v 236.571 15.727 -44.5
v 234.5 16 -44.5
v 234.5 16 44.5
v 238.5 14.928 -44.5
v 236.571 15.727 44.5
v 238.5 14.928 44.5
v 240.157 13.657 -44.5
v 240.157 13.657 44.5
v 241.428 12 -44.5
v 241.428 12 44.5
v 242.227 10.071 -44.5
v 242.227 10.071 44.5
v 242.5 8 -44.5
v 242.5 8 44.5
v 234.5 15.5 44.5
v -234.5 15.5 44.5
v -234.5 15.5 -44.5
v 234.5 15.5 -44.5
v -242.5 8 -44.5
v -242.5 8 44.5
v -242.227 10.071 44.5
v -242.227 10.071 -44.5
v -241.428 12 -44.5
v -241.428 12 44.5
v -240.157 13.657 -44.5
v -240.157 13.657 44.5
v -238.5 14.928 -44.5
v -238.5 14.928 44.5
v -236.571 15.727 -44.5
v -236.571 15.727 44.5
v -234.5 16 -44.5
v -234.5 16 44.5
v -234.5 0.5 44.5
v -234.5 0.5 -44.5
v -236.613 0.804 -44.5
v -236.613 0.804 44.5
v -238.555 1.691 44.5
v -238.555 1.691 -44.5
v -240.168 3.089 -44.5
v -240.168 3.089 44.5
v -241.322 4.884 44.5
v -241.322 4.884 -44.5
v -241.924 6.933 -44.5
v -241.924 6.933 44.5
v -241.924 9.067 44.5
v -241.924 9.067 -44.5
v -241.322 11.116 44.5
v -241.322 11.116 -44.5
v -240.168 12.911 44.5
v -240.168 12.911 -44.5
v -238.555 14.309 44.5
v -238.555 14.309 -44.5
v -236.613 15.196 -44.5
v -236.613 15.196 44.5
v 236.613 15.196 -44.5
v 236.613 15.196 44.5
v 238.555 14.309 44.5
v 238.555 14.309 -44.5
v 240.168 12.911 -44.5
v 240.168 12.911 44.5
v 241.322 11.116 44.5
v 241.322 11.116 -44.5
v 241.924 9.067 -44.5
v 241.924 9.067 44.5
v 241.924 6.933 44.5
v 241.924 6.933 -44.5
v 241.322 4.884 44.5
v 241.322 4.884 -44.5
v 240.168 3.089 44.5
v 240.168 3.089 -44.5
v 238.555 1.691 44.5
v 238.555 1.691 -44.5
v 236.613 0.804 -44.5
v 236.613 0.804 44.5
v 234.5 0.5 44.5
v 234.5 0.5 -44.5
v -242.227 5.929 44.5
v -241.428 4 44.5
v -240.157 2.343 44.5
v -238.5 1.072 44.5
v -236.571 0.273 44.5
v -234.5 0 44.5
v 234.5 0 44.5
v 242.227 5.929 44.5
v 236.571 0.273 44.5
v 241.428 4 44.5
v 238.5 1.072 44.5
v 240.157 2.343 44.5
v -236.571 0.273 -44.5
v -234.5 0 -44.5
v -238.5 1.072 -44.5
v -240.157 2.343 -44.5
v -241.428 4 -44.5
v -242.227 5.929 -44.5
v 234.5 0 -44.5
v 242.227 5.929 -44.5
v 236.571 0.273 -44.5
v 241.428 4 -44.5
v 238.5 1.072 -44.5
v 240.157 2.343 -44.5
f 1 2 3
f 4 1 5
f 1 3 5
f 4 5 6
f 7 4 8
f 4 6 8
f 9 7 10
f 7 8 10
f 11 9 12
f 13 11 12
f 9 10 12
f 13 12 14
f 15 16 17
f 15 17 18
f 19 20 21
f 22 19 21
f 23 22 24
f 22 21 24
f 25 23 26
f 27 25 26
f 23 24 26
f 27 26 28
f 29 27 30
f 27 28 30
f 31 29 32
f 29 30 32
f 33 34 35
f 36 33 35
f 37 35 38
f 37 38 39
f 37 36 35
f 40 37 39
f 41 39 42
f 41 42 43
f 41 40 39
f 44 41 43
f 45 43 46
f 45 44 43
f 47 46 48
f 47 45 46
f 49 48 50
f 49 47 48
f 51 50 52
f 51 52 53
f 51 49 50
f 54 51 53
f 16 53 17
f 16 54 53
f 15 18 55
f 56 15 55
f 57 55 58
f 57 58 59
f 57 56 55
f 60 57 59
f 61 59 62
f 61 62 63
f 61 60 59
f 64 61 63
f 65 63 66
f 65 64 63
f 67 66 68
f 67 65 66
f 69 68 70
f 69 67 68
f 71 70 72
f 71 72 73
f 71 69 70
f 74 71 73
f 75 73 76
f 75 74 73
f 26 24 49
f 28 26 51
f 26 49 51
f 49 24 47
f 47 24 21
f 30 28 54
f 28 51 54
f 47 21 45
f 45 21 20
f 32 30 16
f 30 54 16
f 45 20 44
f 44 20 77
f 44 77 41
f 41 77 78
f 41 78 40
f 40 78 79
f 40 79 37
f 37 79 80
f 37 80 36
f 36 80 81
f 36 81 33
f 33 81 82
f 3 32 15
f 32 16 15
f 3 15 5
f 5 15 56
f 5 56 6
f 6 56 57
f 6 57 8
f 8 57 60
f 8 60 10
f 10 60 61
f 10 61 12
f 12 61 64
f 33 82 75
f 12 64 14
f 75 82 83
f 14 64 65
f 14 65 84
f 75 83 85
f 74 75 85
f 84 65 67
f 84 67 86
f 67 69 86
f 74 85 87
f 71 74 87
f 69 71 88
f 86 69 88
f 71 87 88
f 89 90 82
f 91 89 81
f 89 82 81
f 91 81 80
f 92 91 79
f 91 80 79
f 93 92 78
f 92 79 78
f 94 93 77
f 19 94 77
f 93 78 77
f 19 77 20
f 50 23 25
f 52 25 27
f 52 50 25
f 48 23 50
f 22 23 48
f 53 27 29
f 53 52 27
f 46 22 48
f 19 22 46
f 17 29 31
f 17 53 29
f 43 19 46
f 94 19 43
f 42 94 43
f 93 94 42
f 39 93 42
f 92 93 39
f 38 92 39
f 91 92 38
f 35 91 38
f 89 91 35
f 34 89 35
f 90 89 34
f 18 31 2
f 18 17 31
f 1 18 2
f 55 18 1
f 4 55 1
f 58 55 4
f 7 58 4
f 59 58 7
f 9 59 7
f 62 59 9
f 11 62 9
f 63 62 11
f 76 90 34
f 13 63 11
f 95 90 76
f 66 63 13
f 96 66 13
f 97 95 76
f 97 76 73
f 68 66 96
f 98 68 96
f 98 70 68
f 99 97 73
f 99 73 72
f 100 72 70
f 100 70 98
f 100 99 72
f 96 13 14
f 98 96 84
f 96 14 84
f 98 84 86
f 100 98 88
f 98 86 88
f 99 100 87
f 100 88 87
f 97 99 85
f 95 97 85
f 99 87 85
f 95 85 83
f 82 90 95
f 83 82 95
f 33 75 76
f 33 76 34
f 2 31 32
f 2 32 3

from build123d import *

# Parameters (mm, degrees)
CROQUIS1_W              = 485
CROQUIS1_H              = 89
SALIENTE_EXTRUIR1_DEPTH = 16
CORTAR_EXTRUIR2_DEPTH   = 89
CORTAR_EXTRUIR3_DEPTH   = 89
CORTAR_EXTRUIR4_DEPTH   = 89


with BuildPart() as part:
    # Croquis1 → Saliente-Extruir1 (new body)
    with BuildSketch(Plane(origin=(0, 0, 0), x_dir=(1, 0, 0), z_dir=(0, 1, 0))):
        Rectangle(CROQUIS1_W, CROQUIS1_H)
    extrude(amount=SALIENTE_EXTRUIR1_DEPTH)

    # Croquis2 → Cortar-Extruir2 (cut)
    with BuildSketch(Plane.XY.offset(44.5)):
        with BuildLine():
            ThreePointArc((-234.5, 0), (-240.156854249, 2.343145751), (-242.5, 8))
            Line((-242.5, 8), (-242.5, 0))
            Line((-242.5, 0), (-234.5, 0))
        make_face()
        with BuildLine():
            ThreePointArc((-242.5, 8), (-240.156854236, 13.656854263), (-234.499999961, 16))
            Line((-234.499999961, 16), (-242.5, 16))
            Line((-242.5, 16), (-242.5, 8))
        make_face()
    extrude(amount=-CORTAR_EXTRUIR2_DEPTH, mode=Mode.SUBTRACT)

    # Croquis3 → Cortar-Extruir3 (cut)
    with BuildSketch(Plane.XY.offset(44.5)):
        with BuildLine():
            Line((242.5, 16), (234.5, 16))
            ThreePointArc((234.5, 16), (240.156854249, 13.656854249), (242.5, 8))
            Line((242.5, 8), (242.5, 16))
        make_face()
        with BuildLine():
            Line((242.5, 0), (242.5, 8))
            ThreePointArc((242.5, 8), (240.156854249, 2.343145751), (234.5, 0))
            Line((234.5, 0), (242.5, 0))
        make_face()
    extrude(amount=-CORTAR_EXTRUIR3_DEPTH, mode=Mode.SUBTRACT)

    # Croquis4 → Cortar-Extruir4 (cut)
    with BuildSketch(Plane.XY.offset(44.5)):
        with BuildLine():
            Line((-234.5, 15.5), (234.5, 15.5))
            ThreePointArc((234.5, 15.5), (242, 8), (234.5, 0.5))
            Line((234.5, 0.5), (-234.5, 0.5))
            ThreePointArc((-234.5, 0.5), (-242, 8), (-234.5, 15.5))
        make_face()
    extrude(amount=-CORTAR_EXTRUIR4_DEPTH, mode=Mode.SUBTRACT)


solid = part.part
